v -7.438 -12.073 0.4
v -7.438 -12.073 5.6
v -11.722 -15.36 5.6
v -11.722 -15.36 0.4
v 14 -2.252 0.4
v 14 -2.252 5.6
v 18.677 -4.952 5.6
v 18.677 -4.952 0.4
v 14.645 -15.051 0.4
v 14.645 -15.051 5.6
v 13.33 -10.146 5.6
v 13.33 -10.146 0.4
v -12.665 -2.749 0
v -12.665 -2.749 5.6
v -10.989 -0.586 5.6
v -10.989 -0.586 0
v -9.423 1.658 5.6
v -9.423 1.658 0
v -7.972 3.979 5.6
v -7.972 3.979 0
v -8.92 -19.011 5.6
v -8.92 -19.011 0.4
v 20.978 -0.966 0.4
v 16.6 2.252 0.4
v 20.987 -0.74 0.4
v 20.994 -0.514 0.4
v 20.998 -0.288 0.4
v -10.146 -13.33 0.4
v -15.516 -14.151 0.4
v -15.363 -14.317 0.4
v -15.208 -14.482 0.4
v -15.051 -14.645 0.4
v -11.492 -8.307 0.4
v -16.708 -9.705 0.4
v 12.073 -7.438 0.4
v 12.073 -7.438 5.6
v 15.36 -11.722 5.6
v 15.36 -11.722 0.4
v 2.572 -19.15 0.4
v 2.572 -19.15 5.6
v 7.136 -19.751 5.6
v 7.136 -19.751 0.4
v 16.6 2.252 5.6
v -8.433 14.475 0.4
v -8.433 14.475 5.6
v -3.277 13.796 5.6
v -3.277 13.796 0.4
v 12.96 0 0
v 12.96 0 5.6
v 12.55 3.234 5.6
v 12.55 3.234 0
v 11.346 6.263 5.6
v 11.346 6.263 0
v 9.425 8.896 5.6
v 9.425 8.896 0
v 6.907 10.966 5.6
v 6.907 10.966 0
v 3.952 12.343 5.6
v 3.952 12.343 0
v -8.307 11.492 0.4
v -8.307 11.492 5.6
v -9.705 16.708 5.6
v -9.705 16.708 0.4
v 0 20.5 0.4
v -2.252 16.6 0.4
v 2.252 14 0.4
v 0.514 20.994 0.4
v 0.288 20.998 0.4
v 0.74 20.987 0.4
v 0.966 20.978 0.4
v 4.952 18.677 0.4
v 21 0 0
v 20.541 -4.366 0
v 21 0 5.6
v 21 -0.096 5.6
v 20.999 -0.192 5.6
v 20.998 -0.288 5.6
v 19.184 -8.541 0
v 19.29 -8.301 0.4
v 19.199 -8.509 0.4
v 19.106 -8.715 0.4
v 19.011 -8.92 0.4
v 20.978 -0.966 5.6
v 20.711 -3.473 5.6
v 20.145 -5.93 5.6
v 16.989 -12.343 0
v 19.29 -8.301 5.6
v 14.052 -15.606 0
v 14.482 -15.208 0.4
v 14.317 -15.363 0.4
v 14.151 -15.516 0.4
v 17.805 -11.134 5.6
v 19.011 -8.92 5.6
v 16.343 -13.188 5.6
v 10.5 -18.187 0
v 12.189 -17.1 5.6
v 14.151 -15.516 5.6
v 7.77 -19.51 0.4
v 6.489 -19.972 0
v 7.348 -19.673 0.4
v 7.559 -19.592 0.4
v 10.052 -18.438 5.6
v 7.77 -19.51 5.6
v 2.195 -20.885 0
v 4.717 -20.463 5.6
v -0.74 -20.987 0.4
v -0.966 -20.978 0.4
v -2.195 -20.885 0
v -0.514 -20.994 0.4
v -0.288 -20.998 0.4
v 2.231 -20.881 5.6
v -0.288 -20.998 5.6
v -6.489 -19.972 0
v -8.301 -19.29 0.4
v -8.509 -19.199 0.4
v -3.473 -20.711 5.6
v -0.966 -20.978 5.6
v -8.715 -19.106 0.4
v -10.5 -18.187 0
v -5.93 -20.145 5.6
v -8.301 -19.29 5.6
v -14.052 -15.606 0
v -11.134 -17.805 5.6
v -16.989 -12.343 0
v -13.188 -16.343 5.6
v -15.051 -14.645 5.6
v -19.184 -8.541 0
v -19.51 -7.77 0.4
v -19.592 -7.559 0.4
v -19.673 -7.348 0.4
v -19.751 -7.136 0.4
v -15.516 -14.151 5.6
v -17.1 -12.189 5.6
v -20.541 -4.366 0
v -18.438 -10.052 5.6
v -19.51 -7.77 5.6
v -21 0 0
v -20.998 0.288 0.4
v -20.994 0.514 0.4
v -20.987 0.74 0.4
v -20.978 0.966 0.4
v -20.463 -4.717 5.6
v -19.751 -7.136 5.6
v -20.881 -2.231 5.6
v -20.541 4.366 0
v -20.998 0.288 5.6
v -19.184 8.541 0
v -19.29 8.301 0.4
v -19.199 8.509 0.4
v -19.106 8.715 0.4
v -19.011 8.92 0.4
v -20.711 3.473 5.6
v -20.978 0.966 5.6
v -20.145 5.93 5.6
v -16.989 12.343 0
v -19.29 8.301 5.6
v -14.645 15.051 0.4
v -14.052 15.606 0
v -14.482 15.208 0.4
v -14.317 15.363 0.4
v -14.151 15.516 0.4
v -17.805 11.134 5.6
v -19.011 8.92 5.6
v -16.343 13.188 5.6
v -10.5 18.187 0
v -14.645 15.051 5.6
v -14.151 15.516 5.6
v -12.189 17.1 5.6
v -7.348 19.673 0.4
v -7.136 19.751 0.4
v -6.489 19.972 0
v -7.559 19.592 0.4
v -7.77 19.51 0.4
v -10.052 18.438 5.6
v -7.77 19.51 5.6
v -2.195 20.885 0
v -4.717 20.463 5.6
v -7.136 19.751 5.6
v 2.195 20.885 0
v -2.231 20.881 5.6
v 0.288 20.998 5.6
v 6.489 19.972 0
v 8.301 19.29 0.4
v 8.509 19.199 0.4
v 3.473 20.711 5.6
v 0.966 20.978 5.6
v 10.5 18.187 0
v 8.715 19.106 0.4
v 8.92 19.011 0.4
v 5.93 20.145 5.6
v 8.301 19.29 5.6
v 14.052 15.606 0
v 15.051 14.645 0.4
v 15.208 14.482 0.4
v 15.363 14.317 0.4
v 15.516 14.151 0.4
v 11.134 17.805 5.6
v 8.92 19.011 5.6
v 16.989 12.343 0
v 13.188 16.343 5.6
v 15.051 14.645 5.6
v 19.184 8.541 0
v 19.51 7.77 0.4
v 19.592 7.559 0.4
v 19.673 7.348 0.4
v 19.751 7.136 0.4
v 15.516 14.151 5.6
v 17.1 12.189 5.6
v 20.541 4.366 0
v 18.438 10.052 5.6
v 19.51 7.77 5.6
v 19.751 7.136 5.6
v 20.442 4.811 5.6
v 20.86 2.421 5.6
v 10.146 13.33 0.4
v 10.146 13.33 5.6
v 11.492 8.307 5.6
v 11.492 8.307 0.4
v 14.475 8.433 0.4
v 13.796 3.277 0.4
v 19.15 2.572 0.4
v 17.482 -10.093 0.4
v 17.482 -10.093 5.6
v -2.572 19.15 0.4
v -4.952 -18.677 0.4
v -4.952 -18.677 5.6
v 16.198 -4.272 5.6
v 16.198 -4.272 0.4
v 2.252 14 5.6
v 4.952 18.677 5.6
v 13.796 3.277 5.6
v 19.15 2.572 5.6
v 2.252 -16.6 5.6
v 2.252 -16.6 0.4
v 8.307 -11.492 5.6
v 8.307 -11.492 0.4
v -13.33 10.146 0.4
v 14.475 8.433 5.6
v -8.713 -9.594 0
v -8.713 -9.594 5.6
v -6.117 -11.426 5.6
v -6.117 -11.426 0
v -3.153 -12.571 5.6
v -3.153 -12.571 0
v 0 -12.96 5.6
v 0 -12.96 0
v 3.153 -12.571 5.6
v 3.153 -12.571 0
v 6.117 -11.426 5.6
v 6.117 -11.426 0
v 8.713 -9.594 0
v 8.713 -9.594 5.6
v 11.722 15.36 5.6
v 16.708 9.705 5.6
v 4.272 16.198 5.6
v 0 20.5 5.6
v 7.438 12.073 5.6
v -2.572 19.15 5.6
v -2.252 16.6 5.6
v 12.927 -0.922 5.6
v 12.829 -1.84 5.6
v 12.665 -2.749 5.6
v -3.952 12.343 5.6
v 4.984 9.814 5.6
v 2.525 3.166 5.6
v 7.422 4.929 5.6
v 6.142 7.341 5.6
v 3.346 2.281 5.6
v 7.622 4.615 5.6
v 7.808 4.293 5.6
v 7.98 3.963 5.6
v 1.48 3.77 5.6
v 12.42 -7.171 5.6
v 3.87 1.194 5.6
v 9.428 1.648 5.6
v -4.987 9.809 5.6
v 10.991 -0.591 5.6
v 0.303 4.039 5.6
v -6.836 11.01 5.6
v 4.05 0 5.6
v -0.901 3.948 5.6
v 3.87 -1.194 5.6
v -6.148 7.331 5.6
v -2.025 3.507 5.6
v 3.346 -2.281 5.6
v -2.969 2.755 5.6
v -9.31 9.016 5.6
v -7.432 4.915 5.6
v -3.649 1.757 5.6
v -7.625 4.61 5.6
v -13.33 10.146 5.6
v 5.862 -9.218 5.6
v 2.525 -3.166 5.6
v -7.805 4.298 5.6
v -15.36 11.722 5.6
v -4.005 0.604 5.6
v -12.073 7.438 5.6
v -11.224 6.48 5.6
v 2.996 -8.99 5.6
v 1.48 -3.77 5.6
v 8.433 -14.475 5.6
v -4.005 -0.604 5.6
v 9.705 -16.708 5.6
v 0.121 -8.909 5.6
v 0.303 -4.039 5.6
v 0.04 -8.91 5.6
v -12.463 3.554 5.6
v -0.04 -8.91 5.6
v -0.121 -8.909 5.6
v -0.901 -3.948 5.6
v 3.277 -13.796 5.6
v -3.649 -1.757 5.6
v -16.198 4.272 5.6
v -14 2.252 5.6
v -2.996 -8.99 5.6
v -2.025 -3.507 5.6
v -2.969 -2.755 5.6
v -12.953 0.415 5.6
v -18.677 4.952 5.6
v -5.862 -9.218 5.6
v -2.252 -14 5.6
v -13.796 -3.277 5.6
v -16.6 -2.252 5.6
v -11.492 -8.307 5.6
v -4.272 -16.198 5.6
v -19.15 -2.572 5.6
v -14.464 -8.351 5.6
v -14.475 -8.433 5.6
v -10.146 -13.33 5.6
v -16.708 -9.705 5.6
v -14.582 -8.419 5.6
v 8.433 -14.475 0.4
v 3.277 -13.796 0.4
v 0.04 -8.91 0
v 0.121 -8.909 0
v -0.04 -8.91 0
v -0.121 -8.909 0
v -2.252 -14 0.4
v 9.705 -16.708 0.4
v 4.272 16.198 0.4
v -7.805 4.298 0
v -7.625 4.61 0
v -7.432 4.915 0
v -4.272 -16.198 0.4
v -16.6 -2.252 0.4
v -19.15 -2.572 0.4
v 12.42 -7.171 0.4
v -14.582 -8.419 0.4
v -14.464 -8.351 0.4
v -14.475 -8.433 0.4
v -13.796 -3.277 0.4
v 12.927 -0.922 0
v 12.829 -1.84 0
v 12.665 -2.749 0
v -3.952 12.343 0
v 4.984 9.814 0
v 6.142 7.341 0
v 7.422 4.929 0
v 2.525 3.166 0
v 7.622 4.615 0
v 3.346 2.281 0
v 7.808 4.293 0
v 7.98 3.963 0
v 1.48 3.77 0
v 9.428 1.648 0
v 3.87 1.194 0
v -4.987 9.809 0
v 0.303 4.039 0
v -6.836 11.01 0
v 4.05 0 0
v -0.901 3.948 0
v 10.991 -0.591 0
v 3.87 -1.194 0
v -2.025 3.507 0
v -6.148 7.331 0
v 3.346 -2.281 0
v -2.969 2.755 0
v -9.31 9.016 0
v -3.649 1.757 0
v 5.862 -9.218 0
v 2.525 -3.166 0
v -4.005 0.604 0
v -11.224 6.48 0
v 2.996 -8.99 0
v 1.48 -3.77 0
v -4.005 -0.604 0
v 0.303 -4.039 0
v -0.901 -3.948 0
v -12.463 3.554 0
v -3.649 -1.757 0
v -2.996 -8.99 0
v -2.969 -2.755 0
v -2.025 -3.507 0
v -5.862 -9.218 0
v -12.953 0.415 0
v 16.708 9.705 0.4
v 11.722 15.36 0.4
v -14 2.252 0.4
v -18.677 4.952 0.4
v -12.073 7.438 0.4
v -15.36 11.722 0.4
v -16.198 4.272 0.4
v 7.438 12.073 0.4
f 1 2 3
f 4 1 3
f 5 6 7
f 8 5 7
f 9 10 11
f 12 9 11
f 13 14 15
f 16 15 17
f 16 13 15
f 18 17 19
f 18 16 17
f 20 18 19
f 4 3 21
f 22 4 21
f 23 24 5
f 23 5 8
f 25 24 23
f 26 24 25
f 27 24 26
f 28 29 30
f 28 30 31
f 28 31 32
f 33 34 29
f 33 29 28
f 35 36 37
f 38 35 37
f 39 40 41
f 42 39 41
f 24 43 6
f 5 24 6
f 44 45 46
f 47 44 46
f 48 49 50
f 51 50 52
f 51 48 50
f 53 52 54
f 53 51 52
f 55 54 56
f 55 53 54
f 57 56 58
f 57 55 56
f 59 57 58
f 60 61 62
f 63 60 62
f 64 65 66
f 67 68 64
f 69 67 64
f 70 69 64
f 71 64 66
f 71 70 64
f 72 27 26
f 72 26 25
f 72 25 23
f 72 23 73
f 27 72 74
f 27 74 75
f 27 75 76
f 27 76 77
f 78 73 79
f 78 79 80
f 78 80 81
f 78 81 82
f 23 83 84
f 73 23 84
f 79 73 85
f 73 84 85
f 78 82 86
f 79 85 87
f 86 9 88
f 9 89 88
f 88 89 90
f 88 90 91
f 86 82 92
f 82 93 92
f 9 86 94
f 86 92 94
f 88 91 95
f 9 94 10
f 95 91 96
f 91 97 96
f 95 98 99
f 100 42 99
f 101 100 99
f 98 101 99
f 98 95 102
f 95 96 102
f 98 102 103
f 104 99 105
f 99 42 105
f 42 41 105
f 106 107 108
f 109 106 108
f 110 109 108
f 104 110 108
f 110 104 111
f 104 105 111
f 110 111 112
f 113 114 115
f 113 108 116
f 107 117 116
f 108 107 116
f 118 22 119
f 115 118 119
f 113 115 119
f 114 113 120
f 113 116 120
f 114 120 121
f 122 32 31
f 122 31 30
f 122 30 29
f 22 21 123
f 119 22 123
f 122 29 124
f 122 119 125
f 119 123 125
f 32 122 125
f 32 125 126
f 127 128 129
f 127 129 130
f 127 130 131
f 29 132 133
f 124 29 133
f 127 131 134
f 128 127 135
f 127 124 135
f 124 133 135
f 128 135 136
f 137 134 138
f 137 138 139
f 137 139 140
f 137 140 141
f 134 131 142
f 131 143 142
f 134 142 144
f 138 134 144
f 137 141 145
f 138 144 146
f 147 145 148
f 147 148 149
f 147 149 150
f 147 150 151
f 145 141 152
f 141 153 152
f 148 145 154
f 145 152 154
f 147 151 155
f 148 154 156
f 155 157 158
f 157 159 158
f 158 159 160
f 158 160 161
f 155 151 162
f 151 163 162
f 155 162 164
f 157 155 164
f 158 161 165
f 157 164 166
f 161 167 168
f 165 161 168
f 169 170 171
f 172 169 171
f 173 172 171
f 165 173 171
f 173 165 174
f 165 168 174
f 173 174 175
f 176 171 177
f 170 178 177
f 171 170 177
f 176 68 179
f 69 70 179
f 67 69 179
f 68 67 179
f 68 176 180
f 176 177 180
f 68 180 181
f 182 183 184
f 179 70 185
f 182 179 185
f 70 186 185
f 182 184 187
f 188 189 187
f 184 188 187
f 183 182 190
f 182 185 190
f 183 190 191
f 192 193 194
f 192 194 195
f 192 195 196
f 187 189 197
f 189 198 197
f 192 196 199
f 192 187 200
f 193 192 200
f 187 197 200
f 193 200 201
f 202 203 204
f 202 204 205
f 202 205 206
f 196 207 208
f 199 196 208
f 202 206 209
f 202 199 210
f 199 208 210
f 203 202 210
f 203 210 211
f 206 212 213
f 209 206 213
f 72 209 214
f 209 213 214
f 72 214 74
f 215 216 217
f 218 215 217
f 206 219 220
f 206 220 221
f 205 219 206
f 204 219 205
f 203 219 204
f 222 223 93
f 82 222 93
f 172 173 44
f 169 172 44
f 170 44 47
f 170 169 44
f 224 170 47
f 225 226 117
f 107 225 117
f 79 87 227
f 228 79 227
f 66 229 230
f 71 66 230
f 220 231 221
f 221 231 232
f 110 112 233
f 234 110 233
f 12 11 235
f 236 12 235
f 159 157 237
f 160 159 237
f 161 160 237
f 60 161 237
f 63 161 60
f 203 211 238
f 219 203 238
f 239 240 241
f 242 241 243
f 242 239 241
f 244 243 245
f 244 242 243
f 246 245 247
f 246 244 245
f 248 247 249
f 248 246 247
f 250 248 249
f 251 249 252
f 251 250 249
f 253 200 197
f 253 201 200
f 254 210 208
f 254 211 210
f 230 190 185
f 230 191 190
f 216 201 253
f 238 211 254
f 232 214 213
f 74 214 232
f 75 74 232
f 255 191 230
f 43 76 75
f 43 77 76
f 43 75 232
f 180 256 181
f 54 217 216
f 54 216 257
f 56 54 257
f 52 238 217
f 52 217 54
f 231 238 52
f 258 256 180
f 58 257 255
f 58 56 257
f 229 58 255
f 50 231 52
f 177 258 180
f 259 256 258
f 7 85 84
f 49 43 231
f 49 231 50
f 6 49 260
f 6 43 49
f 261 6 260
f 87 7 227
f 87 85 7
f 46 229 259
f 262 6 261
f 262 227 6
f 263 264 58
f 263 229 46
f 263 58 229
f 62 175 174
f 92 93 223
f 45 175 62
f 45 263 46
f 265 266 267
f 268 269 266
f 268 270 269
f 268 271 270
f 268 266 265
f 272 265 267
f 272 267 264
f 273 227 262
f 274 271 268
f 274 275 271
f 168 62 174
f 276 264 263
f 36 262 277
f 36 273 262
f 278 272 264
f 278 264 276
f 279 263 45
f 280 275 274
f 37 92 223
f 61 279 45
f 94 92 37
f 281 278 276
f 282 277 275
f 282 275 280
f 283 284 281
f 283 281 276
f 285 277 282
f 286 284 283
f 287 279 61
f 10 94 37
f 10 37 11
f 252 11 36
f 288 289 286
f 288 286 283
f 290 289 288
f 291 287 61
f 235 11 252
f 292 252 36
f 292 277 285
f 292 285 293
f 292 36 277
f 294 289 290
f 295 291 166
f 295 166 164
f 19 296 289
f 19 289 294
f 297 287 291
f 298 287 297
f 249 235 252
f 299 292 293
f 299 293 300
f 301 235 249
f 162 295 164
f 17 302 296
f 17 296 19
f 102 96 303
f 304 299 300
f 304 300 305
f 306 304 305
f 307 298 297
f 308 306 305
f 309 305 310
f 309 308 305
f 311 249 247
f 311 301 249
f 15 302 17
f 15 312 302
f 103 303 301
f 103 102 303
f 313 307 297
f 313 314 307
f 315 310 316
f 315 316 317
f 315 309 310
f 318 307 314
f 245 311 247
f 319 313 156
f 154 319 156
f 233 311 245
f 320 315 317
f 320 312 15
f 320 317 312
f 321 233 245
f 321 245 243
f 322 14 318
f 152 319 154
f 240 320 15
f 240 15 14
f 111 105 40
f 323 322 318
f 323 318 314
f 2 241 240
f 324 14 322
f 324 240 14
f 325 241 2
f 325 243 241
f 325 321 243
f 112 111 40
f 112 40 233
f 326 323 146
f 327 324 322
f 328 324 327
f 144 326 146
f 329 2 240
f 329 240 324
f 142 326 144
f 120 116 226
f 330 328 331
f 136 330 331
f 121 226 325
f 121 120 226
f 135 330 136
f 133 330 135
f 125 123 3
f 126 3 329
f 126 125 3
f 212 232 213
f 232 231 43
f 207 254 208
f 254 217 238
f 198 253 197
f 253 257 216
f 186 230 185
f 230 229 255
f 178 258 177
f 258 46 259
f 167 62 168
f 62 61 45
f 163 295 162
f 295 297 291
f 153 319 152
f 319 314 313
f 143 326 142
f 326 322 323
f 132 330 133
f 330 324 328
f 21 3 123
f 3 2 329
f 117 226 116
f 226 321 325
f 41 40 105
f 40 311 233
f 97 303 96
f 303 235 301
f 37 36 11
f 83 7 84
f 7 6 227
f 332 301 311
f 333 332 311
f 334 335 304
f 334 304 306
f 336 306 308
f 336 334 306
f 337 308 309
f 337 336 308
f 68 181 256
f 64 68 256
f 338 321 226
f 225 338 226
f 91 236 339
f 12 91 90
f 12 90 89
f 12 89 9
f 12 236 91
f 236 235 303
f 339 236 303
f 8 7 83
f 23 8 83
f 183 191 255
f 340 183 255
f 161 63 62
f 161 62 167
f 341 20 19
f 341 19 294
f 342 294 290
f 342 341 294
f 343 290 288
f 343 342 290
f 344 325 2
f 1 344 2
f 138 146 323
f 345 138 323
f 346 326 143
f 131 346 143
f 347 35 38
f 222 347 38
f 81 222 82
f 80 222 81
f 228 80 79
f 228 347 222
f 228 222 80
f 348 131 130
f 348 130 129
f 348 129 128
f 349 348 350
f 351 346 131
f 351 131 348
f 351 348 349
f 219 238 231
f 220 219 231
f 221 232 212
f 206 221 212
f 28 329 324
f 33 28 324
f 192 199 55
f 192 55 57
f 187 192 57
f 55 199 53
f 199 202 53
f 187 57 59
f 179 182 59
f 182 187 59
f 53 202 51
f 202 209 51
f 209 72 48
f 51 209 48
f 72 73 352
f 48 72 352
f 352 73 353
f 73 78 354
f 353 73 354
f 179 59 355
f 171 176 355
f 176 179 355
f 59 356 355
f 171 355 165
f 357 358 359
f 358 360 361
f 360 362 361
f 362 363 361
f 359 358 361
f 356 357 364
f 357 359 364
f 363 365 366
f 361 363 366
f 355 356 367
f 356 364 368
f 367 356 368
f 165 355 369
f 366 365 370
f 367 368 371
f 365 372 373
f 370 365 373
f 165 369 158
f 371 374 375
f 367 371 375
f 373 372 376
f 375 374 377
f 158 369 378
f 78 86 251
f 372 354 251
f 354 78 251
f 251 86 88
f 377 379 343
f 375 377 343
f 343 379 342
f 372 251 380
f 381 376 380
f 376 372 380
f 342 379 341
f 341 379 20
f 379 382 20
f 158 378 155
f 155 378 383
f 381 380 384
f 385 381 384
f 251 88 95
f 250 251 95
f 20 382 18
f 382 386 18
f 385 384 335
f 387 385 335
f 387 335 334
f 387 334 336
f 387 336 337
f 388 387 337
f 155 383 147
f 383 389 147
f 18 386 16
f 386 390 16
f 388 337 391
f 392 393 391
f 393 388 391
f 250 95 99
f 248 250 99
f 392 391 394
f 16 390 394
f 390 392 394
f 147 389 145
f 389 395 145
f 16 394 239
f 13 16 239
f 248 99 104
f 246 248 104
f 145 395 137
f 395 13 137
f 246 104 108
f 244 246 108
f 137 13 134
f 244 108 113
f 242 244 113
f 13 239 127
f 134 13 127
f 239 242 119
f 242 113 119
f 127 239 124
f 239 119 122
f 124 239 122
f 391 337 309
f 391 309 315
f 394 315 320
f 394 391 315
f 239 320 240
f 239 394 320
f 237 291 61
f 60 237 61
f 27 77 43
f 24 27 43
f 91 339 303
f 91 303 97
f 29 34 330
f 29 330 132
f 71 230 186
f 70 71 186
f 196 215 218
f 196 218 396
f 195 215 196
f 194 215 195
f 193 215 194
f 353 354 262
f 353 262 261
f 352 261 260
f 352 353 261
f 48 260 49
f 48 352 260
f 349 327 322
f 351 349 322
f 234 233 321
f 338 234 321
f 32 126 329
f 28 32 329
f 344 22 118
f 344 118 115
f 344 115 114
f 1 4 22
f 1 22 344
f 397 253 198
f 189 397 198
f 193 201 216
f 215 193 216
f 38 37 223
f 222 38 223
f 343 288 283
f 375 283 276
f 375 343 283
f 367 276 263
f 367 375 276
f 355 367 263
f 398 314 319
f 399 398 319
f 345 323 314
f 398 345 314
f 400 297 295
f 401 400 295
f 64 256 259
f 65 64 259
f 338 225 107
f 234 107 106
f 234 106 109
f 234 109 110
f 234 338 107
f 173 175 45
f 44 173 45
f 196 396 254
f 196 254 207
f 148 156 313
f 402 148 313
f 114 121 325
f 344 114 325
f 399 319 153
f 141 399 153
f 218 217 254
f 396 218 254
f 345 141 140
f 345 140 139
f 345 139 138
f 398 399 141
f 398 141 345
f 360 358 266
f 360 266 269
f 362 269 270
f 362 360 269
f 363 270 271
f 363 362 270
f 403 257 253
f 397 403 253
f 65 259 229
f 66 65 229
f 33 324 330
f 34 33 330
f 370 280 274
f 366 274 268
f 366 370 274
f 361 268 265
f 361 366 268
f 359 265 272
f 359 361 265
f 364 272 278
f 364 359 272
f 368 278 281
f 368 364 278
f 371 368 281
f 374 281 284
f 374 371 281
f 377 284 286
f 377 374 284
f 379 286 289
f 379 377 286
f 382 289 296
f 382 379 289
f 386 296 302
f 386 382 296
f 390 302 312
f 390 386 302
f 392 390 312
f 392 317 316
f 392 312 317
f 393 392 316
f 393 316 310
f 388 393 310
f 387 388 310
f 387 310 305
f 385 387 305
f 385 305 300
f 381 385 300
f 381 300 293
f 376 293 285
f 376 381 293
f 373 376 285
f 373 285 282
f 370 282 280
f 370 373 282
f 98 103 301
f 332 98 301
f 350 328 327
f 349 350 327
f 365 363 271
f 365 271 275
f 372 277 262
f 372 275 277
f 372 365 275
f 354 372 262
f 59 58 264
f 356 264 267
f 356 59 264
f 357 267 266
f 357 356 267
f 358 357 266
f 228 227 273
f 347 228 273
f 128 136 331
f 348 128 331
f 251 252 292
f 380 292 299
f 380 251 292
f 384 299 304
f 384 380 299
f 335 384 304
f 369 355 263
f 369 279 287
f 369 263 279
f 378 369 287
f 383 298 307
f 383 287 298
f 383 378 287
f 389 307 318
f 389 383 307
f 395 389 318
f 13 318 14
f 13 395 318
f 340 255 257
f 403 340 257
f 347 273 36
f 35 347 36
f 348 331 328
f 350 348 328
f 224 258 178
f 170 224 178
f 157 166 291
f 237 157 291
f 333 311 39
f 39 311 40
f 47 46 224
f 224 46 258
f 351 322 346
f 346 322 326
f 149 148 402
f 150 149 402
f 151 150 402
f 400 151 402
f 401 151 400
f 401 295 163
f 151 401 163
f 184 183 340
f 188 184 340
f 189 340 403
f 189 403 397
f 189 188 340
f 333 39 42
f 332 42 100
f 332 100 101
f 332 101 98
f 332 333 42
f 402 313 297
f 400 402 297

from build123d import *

# Parameters (mm, degrees)
F0_W     = 21
F0_H     = 5.6
F2_R     = 4.05
F3_DEPTH = 25
F5_DEPTH = 5.2


# Not quite as in the source:
# - a feature names something its author has since deleted; it is built from what else it names


with BuildPart() as f1:
    # F0 (on Front) → F1 (revolve)
    with BuildSketch(Plane.XZ):
        with Locations((10.5, 2.8)):
            Rectangle(F0_W, F0_H)
    revolve(axis=Axis((0, 0, 2.8), (0, 0, -1)))

    # F2 (on Top) → F3 (cut)
    with BuildSketch(Plane.XY):
        with BuildLine():
            ThreePointArc((7.42224321, 4.929341308), (7.7162863477, 4.455), (7.9800564017, 3.963180519))
            ThreePointArc((7.9800564017, 3.963180519), (10.1958256536, 0.5187206321), (12.6651471812, -2.7487536956))
            ThreePointArc((12.6651471812, -2.7487536956), (12.8860759634, -1.3822612872), (12.96, 0))
            ThreePointArc((12.96, 0), (10.4685384958, 7.640111371), (3.9520830614, 12.3427160494))
            ThreePointArc((3.9520830614, 12.3427160494), (5.5471380717, 8.5704837125), (7.42224321, 4.929341308))
        make_face()
        with BuildLine():
            ThreePointArc((8.7130641198, -9.5939623537), (4.4302657319, -9.0853125174), (0.1209660663, -8.909178818))
            ThreePointArc((0.1209660663, -8.909178818), (0, -8.91), (-0.1209660663, -8.909178818))
            ThreePointArc((-0.1209660663, -8.909178818), (-4.4302657319, -9.0853125174), (-8.7130641198, -9.5939623537))
            ThreePointArc((-8.7130641198, -9.5939623537), (0, -12.96), (8.7130641198, -9.5939623537))
        make_face()
        with BuildLine():
            ThreePointArc((-7.9723979418, 3.9785639441), (-7.7162863477, 4.455), (-7.4317364171, 4.9150171746))
            ThreePointArc((-7.4317364171, 4.9150171746), (-5.551566481, 8.5631200197), (-3.9520830614, 12.3427160494))
            ThreePointArc((-3.9520830614, 12.3427160494), (-11.223689233, 6.48), (-12.6651471812, -2.7487536956))
            ThreePointArc((-12.6651471812, -2.7487536956), (-10.1916627132, 0.5262375935), (-7.9723979418, 3.9785639441))
        make_face()
        Circle(F2_R)
    extrude(amount=F3_DEPTH, mode=Mode.SUBTRACT)

    # F4 (on face) → F5 (cut)
    with BuildSketch(Plane.XY.offset(5.6)):
        with BuildLine():
            Line((0, 15.3), (2.2516660498, 14))
            Line((2.2516660498, 14), (4.9516660498, 18.6765371804))
            Line((4.9516660498, 18.6765371804), (0.9657973165, 20.9777795666))
            ThreePointArc((0.9657973165, 20.9777795666), (0.6267497357, 20.9906451728), (0.2875385478, 20.998031374))
            Line((0.2875385478, 20.998031374), (0, 20.5))
            Line((0, 20.5), (0, 15.7))
            Line((0, 15.7), (0, 15.3))
        make_face()
        Polygon((-2.2516660498, 16.6), (0, 15.3), (0, 15.7), (0, 20.5), align=None)
        with BuildLine():
            ThreePointArc((8.9201290612, 19.011346547), (8.6118133951, 19.1529807092), (8.3012496983, 19.289615171))
            Line((8.3012496983, 19.289615171), (4.2722767998, 16.1980755322))
            Line((4.2722767998, 16.1980755322), (7.4378362306, 12.0726381627))
            Line((7.4378362306, 12.0726381627), (11.7219442682, 15.3599498793))
            Line((11.7219442682, 15.3599498793), (8.9201290612, 19.011346547))
        make_face()
        with BuildLine():
            ThreePointArc((15.5164520175, 14.150608354), (15.2858065313, 14.3994485549), (15.0511708332, 14.6445299191))
            Line((15.0511708332, 14.6445299191), (10.1458042349, 13.3301409005))
            Line((10.1458042349, 13.3301409005), (11.4916632694, 8.3073266038))
            Line((11.4916632694, 8.3073266038), (16.7076627314, 9.7049494474))
            Line((16.7076627314, 9.7049494474), (15.5164520175, 14.150608354))
        make_face()
        with BuildLine():
            ThreePointArc((19.7505358111, 7.1355683146), (19.6326741894, 7.4537308895), (19.5096876479, 7.76994774))
            Line((19.5096876479, 7.76994774), (14.4747249472, 8.4328131548))
            Line((14.4747249472, 8.4328131548), (13.7959887477, 3.2772998756))
            Line((13.7959887477, 3.2772998756), (19.1497909991, 2.5724584376))
            Line((19.1497909991, 2.5724584376), (19.7505358111, 7.1355683146))
        make_face()
        with BuildLine():
            Line((18.6765371804, -4.9516660498), (20.9777795666, -0.9657973165))
            ThreePointArc((20.9777795666, -0.9657973165), (20.9906451728, -0.6267497357), (20.998031374, -0.2875385478))
            Line((20.998031374, -0.2875385478), (16.6, 2.2516660498))
            Line((16.6, 2.2516660498), (14, -2.2516660498))
            Line((14, -2.2516660498), (18.6765371804, -4.9516660498))
        make_face()
        Polygon((17.4822978668, -10.0934093795), (12.4204504984, -7.1709504387), (12.0726381627, -7.4378362306), (15.3599498793, -11.7219442682), align=None)
        with BuildLine():
            ThreePointArc((14.150608354, -15.5164520175), (14.3994485549, -15.2858065313), (14.6445299191, -15.0511708332))
            Line((14.6445299191, -15.0511708332), (13.3301409005, -10.1458042349))
            Line((13.3301409005, -10.1458042349), (8.3073266038, -11.4916632694))
            Line((8.3073266038, -11.4916632694), (9.7049494474, -16.7076627314))
            Line((9.7049494474, -16.7076627314), (14.150608354, -15.5164520175))
        make_face()
        with BuildLine():
            ThreePointArc((7.1355683146, -19.7505358111), (7.4537308895, -19.6326741894), (7.76994774, -19.5096876479))
            Line((7.76994774, -19.5096876479), (8.4328131548, -14.4747249472))
            Line((8.4328131548, -14.4747249472), (3.2772998756, -13.7959887477))
            Line((3.2772998756, -13.7959887477), (2.5724584376, -19.1497909991))
            Line((2.5724584376, -19.1497909991), (7.1355683146, -19.7505358111))
        make_face()
        with BuildLine():
            Line((-4.9516660498, -18.6765371804), (-0.9657973165, -20.9777795666))
            ThreePointArc((-0.9657973165, -20.9777795666), (-0.6267497357, -20.9906451728), (-0.2875385478, -20.998031374))
            Line((-0.2875385478, -20.998031374), (2.2516660498, -16.6))
            Line((2.2516660498, -16.6), (-2.2516660498, -14))
            Line((-2.2516660498, -14), (-4.9516660498, -18.6765371804))
        make_face()
        with BuildLine():
            Line((-11.7219442682, -15.3599498793), (-8.9201290612, -19.011346547))
            ThreePointArc((-8.9201290612, -19.011346547), (-8.6118133951, -19.1529807092), (-8.3012496983, -19.289615171))
            Line((-8.3012496983, -19.289615171), (-4.2722767998, -16.1980755322))
            Line((-4.2722767998, -16.1980755322), (-7.4378362306, -12.0726381627))
            Line((-7.4378362306, -12.0726381627), (-11.7219442682, -15.3599498793))
        make_face()
        with BuildLine():
            Line((-16.7076627314, -9.7049494474), (-15.5164520175, -14.150608354))
            ThreePointArc((-15.5164520175, -14.150608354), (-15.2858065313, -14.3994485549), (-15.0511708332, -14.6445299191))
            Line((-15.0511708332, -14.6445299191), (-10.1458042349, -13.3301409005))
            Line((-10.1458042349, -13.3301409005), (-11.4916632694, -8.3073266038))
            Line((-11.4916632694, -8.3073266038), (-16.7076627314, -9.7049494474))
        make_face()
        with BuildLine():
            ThreePointArc((-20.9777795666, 0.9657973165), (-20.9906451728, 0.6267497357), (-20.998031374, 0.2875385478))
            Line((-20.998031374, 0.2875385478), (-16.6, -2.2516660498))
            Line((-16.6, -2.2516660498), (-14, 2.2516660498))
            Line((-14, 2.2516660498), (-18.6765371804, 4.9516660498))
            Line((-18.6765371804, 4.9516660498), (-20.9777795666, 0.9657973165))
        make_face()
        with BuildLine():
            Line((-15.3599498793, 11.7219442682), (-19.011346547, 8.9201290612))
            ThreePointArc((-19.011346547, 8.9201290612), (-19.1529807092, 8.6118133951), (-19.289615171, 8.3012496983))
            Line((-19.289615171, 8.3012496983), (-16.1980755322, 4.2722767998))
            Line((-16.1980755322, 4.2722767998), (-12.0726381627, 7.4378362306))
            Line((-12.0726381627, 7.4378362306), (-15.3599498793, 11.7219442682))
        make_face()
        with BuildLine():
            Line((-9.7049494474, 16.7076627314), (-14.150608354, 15.5164520175))
            ThreePointArc((-14.150608354, 15.5164520175), (-14.3994485549, 15.2858065313), (-14.6445299191, 15.0511708332))
            Line((-14.6445299191, 15.0511708332), (-13.3301409005, 10.1458042349))
            Line((-13.3301409005, 10.1458042349), (-8.3073266038, 11.4916632694))
            Line((-8.3073266038, 11.4916632694), (-9.7049494474, 16.7076627314))
        make_face()
        with BuildLine():
            Line((-2.5724584376, 19.1497909991), (-7.1355683146, 19.7505358111))
            ThreePointArc((-7.1355683146, 19.7505358111), (-7.4537308895, 19.6326741894), (-7.76994774, 19.5096876479))
            Line((-7.76994774, 19.5096876479), (-8.4328131548, 14.4747249472))
            Line((-8.4328131548, 14.4747249472), (-3.2772998756, 13.7959887477))
            Line((-3.2772998756, 13.7959887477), (-2.5724584376, 19.1497909991))
        make_face()
        with BuildLine():
            Line((-14.5816734862, -8.4187331125), (-14.4639209508, -8.3507486545))
            Line((-14.4639209508, -8.3507486545), (-13.7959887477, -3.2772998756))
            Line((-13.7959887477, -3.2772998756), (-19.1497909991, -2.5724584376))
            Line((-19.1497909991, -2.5724584376), (-19.7505358111, -7.1355683146))
            ThreePointArc((-19.7505358111, -7.1355683146), (-19.6326741894, -7.4537308895), (-19.5096876479, -7.76994774))
            Line((-19.5096876479, -7.76994774), (-14.5816734862, -8.4187331125))
        make_face()
        Polygon((-14.4747249472, -8.4328131548), (-14.4639209508, -8.3507486545), (-14.5816734862, -8.4187331125), align=None)
        with BuildLine():
            Line((16.1980755322, -4.2722767998), (12.4204504984, -7.1709504387))
            Line((12.4204504984, -7.1709504387), (17.4822978668, -10.0934093795))
            Line((17.4822978668, -10.0934093795), (19.011346547, -8.9201290612))
            ThreePointArc((19.011346547, -8.9201290612), (19.1529807092, -8.6118133951), (19.289615171, -8.3012496983))
            Line((19.289615171, -8.3012496983), (16.1980755322, -4.2722767998))
        make_face()
    extrude(amount=-F5_DEPTH, mode=Mode.SUBTRACT)


solid = f1.part
